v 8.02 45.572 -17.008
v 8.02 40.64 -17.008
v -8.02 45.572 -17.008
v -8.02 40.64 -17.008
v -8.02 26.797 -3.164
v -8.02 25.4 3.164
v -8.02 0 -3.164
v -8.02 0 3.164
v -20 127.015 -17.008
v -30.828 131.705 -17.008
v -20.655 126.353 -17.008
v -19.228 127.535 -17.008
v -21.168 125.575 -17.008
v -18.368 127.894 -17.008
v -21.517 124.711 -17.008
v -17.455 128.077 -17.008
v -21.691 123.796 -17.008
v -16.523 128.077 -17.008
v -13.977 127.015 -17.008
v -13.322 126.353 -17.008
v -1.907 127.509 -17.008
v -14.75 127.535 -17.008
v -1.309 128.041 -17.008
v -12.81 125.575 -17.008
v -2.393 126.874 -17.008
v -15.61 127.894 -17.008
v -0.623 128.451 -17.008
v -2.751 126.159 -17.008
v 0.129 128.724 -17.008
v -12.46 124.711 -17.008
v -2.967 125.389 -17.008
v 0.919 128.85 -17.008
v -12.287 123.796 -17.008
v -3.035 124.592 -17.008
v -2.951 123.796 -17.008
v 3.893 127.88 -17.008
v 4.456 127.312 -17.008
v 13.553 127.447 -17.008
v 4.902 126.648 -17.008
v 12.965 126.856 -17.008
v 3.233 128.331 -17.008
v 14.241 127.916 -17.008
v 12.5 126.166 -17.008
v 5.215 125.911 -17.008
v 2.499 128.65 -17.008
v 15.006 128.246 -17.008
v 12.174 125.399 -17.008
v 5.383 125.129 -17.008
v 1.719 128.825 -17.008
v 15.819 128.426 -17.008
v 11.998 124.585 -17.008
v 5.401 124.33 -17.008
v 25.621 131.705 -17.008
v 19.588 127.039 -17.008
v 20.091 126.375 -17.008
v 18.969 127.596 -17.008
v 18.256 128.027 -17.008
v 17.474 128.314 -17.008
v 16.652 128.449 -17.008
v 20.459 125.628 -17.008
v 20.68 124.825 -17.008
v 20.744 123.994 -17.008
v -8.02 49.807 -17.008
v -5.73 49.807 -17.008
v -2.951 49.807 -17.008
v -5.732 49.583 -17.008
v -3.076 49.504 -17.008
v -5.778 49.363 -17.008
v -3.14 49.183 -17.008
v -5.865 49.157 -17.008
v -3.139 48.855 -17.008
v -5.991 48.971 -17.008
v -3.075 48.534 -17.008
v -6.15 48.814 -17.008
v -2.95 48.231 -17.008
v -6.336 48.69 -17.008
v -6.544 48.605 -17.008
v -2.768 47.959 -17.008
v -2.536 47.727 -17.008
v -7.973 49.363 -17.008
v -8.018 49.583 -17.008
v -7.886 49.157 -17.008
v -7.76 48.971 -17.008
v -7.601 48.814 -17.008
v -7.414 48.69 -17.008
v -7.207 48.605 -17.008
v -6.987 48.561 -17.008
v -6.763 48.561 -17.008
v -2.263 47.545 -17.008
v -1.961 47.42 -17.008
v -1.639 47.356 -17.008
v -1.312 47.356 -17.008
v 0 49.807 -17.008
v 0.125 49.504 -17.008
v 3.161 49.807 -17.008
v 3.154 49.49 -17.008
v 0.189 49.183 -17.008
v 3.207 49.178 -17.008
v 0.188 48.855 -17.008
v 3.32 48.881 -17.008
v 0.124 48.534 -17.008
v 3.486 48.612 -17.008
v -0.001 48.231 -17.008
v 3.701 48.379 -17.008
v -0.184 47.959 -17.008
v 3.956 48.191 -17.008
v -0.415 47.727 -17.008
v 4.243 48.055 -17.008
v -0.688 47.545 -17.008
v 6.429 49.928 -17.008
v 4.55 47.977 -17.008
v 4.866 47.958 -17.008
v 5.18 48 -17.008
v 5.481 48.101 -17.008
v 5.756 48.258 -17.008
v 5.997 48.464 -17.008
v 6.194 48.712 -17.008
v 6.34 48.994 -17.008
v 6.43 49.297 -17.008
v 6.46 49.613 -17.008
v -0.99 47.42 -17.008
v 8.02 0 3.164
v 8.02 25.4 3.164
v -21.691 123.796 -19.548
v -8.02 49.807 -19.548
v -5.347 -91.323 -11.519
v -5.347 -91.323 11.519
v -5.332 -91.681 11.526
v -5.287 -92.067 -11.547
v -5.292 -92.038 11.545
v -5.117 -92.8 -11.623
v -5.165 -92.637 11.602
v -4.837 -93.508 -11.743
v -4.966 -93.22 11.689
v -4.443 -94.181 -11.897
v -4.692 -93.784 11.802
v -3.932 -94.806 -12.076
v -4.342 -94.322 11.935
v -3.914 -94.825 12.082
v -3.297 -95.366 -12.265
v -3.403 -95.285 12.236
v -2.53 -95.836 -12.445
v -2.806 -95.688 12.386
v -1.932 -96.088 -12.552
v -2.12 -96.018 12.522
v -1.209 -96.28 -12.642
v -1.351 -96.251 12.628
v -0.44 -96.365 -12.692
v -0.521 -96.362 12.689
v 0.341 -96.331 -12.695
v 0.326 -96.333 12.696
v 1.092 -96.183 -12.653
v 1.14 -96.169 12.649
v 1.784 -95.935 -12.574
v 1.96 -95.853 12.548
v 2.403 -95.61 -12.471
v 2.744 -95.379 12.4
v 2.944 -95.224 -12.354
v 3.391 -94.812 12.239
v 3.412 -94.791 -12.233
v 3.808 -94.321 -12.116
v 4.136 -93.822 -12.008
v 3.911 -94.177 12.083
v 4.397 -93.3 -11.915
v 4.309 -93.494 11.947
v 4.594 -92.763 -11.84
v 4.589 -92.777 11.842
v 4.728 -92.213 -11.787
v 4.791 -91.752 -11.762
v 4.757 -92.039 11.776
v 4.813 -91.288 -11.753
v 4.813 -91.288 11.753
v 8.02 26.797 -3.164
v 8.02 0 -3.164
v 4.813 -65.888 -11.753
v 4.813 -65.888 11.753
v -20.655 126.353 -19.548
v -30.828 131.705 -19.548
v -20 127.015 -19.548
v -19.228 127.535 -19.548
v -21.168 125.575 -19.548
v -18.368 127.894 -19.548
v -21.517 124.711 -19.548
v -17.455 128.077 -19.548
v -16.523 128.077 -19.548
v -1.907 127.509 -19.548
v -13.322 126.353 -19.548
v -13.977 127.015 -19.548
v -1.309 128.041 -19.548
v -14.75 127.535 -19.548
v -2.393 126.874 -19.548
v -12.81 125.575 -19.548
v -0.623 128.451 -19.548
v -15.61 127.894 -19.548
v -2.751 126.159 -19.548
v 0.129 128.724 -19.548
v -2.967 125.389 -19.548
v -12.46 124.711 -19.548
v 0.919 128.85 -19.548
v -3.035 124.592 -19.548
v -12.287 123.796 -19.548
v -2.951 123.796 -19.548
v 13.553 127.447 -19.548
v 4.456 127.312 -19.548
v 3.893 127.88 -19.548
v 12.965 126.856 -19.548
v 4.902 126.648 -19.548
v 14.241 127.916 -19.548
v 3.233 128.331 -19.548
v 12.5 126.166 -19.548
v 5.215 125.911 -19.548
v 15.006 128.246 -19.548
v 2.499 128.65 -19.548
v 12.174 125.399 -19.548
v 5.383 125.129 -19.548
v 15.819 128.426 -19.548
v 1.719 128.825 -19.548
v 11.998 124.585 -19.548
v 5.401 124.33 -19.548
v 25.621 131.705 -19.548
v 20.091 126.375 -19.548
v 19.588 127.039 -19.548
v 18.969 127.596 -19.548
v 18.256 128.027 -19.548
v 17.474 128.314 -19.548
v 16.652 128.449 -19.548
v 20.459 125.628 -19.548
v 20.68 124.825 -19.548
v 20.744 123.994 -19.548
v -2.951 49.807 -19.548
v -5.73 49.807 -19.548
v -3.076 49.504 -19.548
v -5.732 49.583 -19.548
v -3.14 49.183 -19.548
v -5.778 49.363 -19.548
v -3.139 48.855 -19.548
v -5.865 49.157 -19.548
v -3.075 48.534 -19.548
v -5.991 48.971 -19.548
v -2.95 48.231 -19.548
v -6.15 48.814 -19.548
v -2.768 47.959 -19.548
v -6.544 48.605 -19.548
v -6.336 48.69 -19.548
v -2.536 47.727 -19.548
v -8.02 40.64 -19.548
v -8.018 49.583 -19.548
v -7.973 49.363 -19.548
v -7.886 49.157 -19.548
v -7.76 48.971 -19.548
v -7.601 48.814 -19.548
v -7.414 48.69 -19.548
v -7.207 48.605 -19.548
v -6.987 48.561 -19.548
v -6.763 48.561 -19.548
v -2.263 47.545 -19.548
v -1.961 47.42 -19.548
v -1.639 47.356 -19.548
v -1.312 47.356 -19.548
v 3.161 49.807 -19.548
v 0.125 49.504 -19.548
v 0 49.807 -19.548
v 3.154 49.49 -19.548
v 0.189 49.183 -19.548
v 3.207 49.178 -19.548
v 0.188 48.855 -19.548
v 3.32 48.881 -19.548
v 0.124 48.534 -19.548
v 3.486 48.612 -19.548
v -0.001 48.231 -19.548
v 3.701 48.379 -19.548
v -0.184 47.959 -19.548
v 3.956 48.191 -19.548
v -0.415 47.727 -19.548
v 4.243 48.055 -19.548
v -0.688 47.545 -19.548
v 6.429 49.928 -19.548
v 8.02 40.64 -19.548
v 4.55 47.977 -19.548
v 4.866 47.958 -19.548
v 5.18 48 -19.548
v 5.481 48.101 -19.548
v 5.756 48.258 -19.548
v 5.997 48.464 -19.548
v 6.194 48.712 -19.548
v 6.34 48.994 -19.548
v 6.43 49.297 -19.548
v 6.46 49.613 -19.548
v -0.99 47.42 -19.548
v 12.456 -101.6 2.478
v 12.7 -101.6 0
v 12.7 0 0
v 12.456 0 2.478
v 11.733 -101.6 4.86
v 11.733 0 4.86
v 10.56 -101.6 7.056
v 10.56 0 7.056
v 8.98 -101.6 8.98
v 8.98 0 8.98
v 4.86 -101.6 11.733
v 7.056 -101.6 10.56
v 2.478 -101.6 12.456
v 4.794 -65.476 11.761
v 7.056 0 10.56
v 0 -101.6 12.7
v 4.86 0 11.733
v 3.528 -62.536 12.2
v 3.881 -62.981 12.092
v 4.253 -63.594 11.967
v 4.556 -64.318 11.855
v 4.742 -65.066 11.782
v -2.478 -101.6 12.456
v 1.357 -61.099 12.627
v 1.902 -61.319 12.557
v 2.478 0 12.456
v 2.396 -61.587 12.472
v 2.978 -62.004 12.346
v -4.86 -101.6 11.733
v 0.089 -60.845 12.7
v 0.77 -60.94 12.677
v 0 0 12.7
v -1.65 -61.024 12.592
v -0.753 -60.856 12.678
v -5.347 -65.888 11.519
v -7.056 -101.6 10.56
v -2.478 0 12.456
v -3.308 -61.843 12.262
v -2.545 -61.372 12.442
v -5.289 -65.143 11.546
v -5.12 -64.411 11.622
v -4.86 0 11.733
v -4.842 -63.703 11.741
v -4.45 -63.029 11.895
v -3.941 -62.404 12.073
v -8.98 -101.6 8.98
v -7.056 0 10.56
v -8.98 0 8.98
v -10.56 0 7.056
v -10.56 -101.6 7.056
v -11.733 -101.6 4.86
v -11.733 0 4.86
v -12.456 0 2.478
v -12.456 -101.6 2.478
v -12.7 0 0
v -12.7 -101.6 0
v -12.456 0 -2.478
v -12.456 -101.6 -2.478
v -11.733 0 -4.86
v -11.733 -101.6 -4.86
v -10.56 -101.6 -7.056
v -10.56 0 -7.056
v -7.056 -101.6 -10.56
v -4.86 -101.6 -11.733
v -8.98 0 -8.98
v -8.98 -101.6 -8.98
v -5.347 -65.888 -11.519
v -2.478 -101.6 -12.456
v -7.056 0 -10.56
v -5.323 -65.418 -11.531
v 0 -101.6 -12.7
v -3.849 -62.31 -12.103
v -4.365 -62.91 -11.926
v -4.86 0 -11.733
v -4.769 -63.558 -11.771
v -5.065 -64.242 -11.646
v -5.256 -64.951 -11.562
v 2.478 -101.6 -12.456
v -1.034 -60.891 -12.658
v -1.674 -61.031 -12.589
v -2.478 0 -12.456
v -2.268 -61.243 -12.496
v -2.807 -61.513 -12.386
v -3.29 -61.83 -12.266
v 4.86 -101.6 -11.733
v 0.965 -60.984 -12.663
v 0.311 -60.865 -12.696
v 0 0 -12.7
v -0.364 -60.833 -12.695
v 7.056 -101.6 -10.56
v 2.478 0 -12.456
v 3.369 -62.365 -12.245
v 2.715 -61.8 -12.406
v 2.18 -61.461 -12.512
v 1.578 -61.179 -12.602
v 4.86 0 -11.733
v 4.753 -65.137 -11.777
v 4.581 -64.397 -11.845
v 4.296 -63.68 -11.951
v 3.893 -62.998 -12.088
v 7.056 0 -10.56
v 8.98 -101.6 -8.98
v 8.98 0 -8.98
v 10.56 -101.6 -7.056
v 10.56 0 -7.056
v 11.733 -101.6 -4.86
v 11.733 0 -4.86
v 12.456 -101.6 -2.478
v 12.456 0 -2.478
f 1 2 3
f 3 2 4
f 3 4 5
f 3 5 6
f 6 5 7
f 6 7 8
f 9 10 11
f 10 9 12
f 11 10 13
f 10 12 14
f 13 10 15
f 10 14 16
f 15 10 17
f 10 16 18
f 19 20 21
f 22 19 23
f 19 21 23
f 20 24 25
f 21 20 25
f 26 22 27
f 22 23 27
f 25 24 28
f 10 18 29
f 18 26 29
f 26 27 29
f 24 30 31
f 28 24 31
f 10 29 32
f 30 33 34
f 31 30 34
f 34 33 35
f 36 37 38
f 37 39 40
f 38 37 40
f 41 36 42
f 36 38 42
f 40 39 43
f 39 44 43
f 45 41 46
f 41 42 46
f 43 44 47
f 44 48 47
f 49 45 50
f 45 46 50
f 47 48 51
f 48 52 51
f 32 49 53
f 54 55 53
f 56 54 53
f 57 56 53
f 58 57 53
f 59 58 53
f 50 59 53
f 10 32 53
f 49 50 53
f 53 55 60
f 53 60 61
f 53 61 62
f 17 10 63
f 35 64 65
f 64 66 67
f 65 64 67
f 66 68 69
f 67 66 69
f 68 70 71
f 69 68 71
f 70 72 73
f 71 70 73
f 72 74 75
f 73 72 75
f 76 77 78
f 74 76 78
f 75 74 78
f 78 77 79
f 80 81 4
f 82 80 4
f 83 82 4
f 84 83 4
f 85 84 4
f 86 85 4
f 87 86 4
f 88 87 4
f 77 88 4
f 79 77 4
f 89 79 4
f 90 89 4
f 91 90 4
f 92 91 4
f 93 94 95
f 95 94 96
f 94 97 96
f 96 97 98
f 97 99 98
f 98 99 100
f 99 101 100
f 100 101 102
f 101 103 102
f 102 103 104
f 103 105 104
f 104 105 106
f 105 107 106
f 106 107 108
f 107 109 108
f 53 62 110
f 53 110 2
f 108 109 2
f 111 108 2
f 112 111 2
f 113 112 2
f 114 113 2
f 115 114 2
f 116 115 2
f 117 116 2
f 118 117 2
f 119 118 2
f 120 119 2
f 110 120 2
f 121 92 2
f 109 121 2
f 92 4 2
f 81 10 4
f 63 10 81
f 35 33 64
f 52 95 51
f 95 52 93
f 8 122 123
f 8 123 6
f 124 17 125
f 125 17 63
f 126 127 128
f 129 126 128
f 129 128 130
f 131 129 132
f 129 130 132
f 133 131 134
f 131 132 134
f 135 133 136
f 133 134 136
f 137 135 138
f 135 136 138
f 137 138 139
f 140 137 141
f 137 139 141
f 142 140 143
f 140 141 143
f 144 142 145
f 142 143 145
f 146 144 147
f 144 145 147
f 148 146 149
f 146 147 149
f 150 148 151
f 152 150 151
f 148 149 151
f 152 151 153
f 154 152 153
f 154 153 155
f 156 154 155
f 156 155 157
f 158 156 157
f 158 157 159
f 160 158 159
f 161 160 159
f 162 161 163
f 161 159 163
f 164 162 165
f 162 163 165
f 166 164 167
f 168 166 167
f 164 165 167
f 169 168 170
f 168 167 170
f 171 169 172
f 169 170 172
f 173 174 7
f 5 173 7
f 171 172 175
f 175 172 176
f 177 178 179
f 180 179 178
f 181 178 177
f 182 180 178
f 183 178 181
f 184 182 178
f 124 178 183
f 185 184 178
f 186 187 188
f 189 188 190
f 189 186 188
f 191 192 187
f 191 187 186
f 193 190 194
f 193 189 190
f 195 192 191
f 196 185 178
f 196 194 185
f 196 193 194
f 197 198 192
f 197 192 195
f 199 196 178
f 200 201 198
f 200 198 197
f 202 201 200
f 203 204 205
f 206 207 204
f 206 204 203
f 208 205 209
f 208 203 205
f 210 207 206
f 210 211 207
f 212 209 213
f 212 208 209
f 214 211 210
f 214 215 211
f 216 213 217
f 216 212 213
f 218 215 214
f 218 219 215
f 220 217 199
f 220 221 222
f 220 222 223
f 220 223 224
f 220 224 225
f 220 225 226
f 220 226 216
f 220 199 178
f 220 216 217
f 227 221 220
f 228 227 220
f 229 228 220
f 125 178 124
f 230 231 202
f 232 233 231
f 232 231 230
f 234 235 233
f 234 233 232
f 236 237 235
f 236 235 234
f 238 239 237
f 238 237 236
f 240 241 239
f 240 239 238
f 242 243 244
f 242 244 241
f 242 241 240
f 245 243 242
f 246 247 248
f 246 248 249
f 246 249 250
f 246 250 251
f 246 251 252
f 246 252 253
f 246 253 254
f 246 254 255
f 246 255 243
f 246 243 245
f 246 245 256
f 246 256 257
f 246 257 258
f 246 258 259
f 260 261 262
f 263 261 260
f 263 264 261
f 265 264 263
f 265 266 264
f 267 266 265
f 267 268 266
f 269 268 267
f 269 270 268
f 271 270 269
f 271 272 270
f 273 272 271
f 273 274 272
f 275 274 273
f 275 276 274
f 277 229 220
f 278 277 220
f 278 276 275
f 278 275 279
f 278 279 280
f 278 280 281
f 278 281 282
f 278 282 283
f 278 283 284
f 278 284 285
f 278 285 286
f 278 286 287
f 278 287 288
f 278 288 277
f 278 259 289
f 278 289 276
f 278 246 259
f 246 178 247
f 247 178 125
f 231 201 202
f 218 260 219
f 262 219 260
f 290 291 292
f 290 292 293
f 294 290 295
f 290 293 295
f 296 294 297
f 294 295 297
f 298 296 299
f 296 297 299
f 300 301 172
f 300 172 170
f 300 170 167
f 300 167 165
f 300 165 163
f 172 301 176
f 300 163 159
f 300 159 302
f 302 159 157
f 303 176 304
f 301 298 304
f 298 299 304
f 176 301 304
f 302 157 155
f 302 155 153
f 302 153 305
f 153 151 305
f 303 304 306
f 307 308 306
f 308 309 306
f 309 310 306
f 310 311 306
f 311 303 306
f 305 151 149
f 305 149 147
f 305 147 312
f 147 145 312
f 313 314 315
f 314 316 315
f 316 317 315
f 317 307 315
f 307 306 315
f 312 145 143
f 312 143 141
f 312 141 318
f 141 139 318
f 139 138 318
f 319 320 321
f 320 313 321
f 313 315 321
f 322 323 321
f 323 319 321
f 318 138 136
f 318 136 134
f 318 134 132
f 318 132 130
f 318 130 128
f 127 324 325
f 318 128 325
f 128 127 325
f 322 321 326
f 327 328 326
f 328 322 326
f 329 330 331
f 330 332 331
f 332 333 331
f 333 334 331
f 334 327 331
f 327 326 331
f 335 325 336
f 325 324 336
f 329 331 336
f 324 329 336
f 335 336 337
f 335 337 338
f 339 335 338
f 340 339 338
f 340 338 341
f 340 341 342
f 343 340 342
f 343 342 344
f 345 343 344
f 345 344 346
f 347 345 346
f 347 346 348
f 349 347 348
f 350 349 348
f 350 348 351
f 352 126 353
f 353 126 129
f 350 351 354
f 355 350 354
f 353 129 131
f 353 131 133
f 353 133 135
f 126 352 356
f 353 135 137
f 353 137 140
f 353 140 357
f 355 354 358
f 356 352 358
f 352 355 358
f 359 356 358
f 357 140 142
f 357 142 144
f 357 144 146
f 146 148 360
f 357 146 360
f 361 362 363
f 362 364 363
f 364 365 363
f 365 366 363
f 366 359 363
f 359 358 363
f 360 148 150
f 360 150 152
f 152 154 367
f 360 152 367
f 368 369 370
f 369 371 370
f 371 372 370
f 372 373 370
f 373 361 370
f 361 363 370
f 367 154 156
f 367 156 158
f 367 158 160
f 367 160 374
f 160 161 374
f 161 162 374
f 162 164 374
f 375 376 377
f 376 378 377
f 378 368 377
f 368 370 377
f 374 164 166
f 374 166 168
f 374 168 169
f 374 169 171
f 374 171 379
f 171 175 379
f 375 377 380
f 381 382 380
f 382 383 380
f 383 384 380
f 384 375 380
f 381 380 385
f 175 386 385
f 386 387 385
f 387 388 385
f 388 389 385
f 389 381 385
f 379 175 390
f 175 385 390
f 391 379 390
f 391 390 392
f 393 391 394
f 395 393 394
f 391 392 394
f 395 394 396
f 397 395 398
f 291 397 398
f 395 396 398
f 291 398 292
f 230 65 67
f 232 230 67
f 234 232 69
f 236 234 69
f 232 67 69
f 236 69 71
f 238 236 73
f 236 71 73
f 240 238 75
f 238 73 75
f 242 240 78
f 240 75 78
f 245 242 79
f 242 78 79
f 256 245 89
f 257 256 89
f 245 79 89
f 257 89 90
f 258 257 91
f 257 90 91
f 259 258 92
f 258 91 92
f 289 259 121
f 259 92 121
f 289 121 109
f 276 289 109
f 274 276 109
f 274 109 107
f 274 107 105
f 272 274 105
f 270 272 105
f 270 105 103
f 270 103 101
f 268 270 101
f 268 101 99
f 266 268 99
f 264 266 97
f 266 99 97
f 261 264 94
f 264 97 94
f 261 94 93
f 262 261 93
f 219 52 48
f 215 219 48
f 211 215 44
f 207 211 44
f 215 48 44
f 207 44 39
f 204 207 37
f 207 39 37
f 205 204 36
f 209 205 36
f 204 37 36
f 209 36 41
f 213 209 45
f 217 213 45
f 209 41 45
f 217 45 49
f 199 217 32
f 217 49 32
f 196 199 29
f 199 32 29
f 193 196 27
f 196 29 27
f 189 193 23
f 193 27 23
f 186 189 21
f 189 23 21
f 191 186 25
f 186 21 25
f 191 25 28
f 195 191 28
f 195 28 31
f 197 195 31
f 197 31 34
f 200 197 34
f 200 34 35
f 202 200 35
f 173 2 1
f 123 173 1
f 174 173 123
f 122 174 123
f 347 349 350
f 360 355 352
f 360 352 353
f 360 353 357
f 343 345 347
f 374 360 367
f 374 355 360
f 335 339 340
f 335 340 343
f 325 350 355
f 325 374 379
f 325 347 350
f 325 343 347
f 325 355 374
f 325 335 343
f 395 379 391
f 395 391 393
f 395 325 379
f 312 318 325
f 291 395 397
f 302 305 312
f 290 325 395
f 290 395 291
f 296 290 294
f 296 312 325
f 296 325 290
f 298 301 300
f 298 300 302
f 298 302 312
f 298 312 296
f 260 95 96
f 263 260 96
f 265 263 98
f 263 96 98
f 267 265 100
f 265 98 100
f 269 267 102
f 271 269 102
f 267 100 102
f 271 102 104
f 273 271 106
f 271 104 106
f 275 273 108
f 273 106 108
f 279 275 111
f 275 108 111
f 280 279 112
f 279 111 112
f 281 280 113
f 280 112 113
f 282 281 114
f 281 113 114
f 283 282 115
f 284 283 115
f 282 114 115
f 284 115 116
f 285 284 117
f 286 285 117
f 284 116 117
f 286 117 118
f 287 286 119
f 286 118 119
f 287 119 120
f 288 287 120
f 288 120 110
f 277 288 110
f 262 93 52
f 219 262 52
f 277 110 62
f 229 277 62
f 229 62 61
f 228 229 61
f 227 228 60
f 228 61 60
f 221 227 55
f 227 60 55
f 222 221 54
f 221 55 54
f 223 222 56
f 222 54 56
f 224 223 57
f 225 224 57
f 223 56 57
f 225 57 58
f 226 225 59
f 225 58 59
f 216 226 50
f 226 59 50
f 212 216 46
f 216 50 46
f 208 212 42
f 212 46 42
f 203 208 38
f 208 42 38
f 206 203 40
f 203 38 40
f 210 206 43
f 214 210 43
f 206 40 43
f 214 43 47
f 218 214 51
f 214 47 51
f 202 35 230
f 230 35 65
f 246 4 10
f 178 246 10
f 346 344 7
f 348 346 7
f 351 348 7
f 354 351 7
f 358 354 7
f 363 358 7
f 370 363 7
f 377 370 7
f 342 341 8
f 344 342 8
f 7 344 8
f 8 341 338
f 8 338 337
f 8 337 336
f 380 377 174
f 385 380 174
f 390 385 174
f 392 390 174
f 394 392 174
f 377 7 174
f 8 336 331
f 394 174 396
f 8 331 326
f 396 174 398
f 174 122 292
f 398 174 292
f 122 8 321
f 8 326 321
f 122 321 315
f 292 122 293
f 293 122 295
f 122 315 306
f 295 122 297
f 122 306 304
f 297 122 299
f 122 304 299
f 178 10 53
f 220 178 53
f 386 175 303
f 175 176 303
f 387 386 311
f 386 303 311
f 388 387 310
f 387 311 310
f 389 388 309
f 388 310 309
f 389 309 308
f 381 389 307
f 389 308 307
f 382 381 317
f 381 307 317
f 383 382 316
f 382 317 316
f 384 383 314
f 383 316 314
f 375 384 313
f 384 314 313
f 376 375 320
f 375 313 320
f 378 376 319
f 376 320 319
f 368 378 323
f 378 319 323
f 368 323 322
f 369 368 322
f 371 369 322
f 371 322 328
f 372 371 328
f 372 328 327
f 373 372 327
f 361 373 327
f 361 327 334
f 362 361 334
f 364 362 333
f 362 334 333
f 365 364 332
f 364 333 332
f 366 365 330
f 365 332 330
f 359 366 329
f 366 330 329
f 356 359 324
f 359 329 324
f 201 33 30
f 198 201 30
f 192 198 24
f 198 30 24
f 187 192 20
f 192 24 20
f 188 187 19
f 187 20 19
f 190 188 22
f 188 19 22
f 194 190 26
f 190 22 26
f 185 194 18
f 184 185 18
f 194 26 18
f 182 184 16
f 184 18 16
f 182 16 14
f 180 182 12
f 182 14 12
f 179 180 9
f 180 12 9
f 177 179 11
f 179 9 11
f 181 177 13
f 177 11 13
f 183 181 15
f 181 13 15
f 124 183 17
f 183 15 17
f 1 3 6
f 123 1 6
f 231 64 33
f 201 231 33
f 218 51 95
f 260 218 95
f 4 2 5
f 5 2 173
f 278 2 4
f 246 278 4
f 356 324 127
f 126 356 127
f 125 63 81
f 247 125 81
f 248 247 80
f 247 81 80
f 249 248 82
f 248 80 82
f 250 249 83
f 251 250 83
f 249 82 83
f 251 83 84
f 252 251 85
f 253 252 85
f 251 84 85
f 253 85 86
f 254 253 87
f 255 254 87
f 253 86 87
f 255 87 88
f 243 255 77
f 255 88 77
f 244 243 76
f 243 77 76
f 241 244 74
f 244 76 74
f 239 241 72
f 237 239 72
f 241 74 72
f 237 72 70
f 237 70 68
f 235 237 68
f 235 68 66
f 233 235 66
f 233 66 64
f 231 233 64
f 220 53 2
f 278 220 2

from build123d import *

# Parameters (mm, degrees)
F0_R        = 12.7
F1_DEPTH    = 101.6
F3_DEPTH    = 12.7
F4_W        = 16.0404779017
F4_H        = 6.3281008042
F5_DEPTH    = 25.4
F6_W        = 16.0404779017
F6_H        = 20.1715745497
F7_DEPTH    = 25.4
F8_T1_DEPTH = 146.6819736904
F9_T4_DEPTH = 94.4253753749
F11_DEPTH   = 2.54
F13_DEPTH   = 2.54


# Not quite as in the source:
# - a fillet or chamfer that OpenCascade refuses, or shapes differently, is made with other operations: its cross-section is extruded or revolved along the edge and cut away or added


with BuildPart() as f1:
    # F0 (on Front) → F1 (new body)
    with BuildSketch(Plane.XZ):
        Circle(F0_R)
    extrude(amount=F1_DEPTH)

    # F2 (on Top) → F3 (cut, symmetric)
    with BuildSketch(Plane.XY):
        with BuildLine():
            Line((-5.3473415828, -65.8879665646), (-5.3473415828, -91.3225393835))
            ThreePointArc((-5.3473415828, -91.3225393835), (-0.2501727202, -96.3679371527), (4.8125407702, -91.2879665646))
            Line((4.8125407702, -91.2879665646), (4.8125407702, -65.8879665646))
            ThreePointArc((4.8125407702, -65.8879665646), (-0.2674004063, -60.8324133101), (-5.3473415828, -65.8879665646))
        make_face()
    extrude(amount=F3_DEPTH, both=True, mode=Mode.SUBTRACT)

    # F4 (on face) → F5 (join)
    with BuildSketch(Plane(origin=(0, 0, 0), x_dir=(-1, 0, 0), z_dir=(0, 1, 0))):
        Rectangle(F4_W, F4_H)
    extrude(amount=F5_DEPTH)

    # F6 (on face) → F7 (join)
    with BuildSketch(Plane(origin=(0, 25.4, 0), x_dir=(-1, 0, 0), z_dir=(0, 1, 0))):
        with Locations((0, -6.9217368728)):
            Rectangle(F6_W, F6_H)
    extrude(amount=F7_DEPTH)

    # F8: chamfer of 25.4 on 1 edges, made by hand

    # F8_s2 → F8_t1 (cut)
    with BuildSketch(Plane.YZ.offset(-73.3409868452)):
        Polygon((50.8, -22.2359495979), (25.4, 3.1640504021), (50.8, 3.1640504021), align=None)
    extrude(amount=F8_T1_DEPTH, mode=Mode.SUBTRACT)

    # F9: chamfer of 15.24 on 1 edges, made by hand


with BuildPart() as f9_tool2:
    # F9_s3 → F9_t4 (new body)
    with BuildSketch(Plane.YZ.offset(47.2126876874)):
        Polygon((40.64, -17.0075241476), (25.4, -1.7675241476), (25.4, -17.0075241476), align=None)
    extrude(amount=-F9_T4_DEPTH)

    split(bisect_by=Plane.XY.offset(-3.1640504021), keep=Keep.BOTTOM)


with BuildPart() as f1_1:
    add(f1.part)

    # F9_t1: cut F9_tool2
    add(f9_tool2.part, mode=Mode.SUBTRACT)


with BuildPart() as f11:
    # F10 (on face) → F11 (new body)
    with BuildSketch(Plane(origin=(0, 0, -17.0075241476), x_dir=(1, 0, 0), z_dir=(0, 0, -1))):
        Polygon((25.6205989037, -131.7045986652), (8.0202389508, -40.64), (-8.0202389508, -40.64), (-30.8284154249, -131.7045986652), align=None)
    extrude(amount=F11_DEPTH)

    # F12 (on face) → F13 (cut)
    with BuildSketch(Plane.XY.offset(-17.0075241476)):
        with BuildLine():
            ThreePointArc((-2.9510988388, 49.8066730797), (-1.4755494194, 47.3481245776), (0, 49.8066730797))
            Line((0, 49.8066730797), (5.4011049135, 124.3297383189))
            ThreePointArc((5.4011049135, 124.3297383189), (0.9191672956, 128.8501607928), (-2.9510988388, 123.7961500883))
            Line((-2.9510988388, 123.7961500883), (-2.9510988388, 49.8066730797))
        make_face()
        with BuildLine():
            ThreePointArc((-8.0202389508, 49.8066730797), (-6.8753334051, 48.5558313222), (-5.7304278594, 49.8066730797))
            Line((-5.7304278594, 49.8066730797), (-12.2866457498, 123.7961500883))
            ThreePointArc((-12.2866457498, 123.7961500883), (-16.9887549329, 128.1000285349), (-21.690864116, 123.7961500883))
            Line((-21.690864116, 123.7961500883), (-8.0202389508, 49.8066730797))
        make_face()
        with BuildLine():
            Line((6.4293653704, 49.9283634126), (20.7443441266, 123.9943369966))
            ThreePointArc((20.7443441266, 123.9943369966), (16.6519501735, 128.448902691), (11.9976941496, 124.5851293206))
            Line((11.9976941496, 124.5851293206), (3.1607365236, 49.8066730797))
            ThreePointArc((3.1607365236, 49.8066730797), (4.8661303133, 47.9583109849), (6.4293653704, 49.9283634126))
        make_face()
    extrude(amount=-F13_DEPTH, mode=Mode.SUBTRACT)


solid = Compound([f1_1.part, f11.part])
